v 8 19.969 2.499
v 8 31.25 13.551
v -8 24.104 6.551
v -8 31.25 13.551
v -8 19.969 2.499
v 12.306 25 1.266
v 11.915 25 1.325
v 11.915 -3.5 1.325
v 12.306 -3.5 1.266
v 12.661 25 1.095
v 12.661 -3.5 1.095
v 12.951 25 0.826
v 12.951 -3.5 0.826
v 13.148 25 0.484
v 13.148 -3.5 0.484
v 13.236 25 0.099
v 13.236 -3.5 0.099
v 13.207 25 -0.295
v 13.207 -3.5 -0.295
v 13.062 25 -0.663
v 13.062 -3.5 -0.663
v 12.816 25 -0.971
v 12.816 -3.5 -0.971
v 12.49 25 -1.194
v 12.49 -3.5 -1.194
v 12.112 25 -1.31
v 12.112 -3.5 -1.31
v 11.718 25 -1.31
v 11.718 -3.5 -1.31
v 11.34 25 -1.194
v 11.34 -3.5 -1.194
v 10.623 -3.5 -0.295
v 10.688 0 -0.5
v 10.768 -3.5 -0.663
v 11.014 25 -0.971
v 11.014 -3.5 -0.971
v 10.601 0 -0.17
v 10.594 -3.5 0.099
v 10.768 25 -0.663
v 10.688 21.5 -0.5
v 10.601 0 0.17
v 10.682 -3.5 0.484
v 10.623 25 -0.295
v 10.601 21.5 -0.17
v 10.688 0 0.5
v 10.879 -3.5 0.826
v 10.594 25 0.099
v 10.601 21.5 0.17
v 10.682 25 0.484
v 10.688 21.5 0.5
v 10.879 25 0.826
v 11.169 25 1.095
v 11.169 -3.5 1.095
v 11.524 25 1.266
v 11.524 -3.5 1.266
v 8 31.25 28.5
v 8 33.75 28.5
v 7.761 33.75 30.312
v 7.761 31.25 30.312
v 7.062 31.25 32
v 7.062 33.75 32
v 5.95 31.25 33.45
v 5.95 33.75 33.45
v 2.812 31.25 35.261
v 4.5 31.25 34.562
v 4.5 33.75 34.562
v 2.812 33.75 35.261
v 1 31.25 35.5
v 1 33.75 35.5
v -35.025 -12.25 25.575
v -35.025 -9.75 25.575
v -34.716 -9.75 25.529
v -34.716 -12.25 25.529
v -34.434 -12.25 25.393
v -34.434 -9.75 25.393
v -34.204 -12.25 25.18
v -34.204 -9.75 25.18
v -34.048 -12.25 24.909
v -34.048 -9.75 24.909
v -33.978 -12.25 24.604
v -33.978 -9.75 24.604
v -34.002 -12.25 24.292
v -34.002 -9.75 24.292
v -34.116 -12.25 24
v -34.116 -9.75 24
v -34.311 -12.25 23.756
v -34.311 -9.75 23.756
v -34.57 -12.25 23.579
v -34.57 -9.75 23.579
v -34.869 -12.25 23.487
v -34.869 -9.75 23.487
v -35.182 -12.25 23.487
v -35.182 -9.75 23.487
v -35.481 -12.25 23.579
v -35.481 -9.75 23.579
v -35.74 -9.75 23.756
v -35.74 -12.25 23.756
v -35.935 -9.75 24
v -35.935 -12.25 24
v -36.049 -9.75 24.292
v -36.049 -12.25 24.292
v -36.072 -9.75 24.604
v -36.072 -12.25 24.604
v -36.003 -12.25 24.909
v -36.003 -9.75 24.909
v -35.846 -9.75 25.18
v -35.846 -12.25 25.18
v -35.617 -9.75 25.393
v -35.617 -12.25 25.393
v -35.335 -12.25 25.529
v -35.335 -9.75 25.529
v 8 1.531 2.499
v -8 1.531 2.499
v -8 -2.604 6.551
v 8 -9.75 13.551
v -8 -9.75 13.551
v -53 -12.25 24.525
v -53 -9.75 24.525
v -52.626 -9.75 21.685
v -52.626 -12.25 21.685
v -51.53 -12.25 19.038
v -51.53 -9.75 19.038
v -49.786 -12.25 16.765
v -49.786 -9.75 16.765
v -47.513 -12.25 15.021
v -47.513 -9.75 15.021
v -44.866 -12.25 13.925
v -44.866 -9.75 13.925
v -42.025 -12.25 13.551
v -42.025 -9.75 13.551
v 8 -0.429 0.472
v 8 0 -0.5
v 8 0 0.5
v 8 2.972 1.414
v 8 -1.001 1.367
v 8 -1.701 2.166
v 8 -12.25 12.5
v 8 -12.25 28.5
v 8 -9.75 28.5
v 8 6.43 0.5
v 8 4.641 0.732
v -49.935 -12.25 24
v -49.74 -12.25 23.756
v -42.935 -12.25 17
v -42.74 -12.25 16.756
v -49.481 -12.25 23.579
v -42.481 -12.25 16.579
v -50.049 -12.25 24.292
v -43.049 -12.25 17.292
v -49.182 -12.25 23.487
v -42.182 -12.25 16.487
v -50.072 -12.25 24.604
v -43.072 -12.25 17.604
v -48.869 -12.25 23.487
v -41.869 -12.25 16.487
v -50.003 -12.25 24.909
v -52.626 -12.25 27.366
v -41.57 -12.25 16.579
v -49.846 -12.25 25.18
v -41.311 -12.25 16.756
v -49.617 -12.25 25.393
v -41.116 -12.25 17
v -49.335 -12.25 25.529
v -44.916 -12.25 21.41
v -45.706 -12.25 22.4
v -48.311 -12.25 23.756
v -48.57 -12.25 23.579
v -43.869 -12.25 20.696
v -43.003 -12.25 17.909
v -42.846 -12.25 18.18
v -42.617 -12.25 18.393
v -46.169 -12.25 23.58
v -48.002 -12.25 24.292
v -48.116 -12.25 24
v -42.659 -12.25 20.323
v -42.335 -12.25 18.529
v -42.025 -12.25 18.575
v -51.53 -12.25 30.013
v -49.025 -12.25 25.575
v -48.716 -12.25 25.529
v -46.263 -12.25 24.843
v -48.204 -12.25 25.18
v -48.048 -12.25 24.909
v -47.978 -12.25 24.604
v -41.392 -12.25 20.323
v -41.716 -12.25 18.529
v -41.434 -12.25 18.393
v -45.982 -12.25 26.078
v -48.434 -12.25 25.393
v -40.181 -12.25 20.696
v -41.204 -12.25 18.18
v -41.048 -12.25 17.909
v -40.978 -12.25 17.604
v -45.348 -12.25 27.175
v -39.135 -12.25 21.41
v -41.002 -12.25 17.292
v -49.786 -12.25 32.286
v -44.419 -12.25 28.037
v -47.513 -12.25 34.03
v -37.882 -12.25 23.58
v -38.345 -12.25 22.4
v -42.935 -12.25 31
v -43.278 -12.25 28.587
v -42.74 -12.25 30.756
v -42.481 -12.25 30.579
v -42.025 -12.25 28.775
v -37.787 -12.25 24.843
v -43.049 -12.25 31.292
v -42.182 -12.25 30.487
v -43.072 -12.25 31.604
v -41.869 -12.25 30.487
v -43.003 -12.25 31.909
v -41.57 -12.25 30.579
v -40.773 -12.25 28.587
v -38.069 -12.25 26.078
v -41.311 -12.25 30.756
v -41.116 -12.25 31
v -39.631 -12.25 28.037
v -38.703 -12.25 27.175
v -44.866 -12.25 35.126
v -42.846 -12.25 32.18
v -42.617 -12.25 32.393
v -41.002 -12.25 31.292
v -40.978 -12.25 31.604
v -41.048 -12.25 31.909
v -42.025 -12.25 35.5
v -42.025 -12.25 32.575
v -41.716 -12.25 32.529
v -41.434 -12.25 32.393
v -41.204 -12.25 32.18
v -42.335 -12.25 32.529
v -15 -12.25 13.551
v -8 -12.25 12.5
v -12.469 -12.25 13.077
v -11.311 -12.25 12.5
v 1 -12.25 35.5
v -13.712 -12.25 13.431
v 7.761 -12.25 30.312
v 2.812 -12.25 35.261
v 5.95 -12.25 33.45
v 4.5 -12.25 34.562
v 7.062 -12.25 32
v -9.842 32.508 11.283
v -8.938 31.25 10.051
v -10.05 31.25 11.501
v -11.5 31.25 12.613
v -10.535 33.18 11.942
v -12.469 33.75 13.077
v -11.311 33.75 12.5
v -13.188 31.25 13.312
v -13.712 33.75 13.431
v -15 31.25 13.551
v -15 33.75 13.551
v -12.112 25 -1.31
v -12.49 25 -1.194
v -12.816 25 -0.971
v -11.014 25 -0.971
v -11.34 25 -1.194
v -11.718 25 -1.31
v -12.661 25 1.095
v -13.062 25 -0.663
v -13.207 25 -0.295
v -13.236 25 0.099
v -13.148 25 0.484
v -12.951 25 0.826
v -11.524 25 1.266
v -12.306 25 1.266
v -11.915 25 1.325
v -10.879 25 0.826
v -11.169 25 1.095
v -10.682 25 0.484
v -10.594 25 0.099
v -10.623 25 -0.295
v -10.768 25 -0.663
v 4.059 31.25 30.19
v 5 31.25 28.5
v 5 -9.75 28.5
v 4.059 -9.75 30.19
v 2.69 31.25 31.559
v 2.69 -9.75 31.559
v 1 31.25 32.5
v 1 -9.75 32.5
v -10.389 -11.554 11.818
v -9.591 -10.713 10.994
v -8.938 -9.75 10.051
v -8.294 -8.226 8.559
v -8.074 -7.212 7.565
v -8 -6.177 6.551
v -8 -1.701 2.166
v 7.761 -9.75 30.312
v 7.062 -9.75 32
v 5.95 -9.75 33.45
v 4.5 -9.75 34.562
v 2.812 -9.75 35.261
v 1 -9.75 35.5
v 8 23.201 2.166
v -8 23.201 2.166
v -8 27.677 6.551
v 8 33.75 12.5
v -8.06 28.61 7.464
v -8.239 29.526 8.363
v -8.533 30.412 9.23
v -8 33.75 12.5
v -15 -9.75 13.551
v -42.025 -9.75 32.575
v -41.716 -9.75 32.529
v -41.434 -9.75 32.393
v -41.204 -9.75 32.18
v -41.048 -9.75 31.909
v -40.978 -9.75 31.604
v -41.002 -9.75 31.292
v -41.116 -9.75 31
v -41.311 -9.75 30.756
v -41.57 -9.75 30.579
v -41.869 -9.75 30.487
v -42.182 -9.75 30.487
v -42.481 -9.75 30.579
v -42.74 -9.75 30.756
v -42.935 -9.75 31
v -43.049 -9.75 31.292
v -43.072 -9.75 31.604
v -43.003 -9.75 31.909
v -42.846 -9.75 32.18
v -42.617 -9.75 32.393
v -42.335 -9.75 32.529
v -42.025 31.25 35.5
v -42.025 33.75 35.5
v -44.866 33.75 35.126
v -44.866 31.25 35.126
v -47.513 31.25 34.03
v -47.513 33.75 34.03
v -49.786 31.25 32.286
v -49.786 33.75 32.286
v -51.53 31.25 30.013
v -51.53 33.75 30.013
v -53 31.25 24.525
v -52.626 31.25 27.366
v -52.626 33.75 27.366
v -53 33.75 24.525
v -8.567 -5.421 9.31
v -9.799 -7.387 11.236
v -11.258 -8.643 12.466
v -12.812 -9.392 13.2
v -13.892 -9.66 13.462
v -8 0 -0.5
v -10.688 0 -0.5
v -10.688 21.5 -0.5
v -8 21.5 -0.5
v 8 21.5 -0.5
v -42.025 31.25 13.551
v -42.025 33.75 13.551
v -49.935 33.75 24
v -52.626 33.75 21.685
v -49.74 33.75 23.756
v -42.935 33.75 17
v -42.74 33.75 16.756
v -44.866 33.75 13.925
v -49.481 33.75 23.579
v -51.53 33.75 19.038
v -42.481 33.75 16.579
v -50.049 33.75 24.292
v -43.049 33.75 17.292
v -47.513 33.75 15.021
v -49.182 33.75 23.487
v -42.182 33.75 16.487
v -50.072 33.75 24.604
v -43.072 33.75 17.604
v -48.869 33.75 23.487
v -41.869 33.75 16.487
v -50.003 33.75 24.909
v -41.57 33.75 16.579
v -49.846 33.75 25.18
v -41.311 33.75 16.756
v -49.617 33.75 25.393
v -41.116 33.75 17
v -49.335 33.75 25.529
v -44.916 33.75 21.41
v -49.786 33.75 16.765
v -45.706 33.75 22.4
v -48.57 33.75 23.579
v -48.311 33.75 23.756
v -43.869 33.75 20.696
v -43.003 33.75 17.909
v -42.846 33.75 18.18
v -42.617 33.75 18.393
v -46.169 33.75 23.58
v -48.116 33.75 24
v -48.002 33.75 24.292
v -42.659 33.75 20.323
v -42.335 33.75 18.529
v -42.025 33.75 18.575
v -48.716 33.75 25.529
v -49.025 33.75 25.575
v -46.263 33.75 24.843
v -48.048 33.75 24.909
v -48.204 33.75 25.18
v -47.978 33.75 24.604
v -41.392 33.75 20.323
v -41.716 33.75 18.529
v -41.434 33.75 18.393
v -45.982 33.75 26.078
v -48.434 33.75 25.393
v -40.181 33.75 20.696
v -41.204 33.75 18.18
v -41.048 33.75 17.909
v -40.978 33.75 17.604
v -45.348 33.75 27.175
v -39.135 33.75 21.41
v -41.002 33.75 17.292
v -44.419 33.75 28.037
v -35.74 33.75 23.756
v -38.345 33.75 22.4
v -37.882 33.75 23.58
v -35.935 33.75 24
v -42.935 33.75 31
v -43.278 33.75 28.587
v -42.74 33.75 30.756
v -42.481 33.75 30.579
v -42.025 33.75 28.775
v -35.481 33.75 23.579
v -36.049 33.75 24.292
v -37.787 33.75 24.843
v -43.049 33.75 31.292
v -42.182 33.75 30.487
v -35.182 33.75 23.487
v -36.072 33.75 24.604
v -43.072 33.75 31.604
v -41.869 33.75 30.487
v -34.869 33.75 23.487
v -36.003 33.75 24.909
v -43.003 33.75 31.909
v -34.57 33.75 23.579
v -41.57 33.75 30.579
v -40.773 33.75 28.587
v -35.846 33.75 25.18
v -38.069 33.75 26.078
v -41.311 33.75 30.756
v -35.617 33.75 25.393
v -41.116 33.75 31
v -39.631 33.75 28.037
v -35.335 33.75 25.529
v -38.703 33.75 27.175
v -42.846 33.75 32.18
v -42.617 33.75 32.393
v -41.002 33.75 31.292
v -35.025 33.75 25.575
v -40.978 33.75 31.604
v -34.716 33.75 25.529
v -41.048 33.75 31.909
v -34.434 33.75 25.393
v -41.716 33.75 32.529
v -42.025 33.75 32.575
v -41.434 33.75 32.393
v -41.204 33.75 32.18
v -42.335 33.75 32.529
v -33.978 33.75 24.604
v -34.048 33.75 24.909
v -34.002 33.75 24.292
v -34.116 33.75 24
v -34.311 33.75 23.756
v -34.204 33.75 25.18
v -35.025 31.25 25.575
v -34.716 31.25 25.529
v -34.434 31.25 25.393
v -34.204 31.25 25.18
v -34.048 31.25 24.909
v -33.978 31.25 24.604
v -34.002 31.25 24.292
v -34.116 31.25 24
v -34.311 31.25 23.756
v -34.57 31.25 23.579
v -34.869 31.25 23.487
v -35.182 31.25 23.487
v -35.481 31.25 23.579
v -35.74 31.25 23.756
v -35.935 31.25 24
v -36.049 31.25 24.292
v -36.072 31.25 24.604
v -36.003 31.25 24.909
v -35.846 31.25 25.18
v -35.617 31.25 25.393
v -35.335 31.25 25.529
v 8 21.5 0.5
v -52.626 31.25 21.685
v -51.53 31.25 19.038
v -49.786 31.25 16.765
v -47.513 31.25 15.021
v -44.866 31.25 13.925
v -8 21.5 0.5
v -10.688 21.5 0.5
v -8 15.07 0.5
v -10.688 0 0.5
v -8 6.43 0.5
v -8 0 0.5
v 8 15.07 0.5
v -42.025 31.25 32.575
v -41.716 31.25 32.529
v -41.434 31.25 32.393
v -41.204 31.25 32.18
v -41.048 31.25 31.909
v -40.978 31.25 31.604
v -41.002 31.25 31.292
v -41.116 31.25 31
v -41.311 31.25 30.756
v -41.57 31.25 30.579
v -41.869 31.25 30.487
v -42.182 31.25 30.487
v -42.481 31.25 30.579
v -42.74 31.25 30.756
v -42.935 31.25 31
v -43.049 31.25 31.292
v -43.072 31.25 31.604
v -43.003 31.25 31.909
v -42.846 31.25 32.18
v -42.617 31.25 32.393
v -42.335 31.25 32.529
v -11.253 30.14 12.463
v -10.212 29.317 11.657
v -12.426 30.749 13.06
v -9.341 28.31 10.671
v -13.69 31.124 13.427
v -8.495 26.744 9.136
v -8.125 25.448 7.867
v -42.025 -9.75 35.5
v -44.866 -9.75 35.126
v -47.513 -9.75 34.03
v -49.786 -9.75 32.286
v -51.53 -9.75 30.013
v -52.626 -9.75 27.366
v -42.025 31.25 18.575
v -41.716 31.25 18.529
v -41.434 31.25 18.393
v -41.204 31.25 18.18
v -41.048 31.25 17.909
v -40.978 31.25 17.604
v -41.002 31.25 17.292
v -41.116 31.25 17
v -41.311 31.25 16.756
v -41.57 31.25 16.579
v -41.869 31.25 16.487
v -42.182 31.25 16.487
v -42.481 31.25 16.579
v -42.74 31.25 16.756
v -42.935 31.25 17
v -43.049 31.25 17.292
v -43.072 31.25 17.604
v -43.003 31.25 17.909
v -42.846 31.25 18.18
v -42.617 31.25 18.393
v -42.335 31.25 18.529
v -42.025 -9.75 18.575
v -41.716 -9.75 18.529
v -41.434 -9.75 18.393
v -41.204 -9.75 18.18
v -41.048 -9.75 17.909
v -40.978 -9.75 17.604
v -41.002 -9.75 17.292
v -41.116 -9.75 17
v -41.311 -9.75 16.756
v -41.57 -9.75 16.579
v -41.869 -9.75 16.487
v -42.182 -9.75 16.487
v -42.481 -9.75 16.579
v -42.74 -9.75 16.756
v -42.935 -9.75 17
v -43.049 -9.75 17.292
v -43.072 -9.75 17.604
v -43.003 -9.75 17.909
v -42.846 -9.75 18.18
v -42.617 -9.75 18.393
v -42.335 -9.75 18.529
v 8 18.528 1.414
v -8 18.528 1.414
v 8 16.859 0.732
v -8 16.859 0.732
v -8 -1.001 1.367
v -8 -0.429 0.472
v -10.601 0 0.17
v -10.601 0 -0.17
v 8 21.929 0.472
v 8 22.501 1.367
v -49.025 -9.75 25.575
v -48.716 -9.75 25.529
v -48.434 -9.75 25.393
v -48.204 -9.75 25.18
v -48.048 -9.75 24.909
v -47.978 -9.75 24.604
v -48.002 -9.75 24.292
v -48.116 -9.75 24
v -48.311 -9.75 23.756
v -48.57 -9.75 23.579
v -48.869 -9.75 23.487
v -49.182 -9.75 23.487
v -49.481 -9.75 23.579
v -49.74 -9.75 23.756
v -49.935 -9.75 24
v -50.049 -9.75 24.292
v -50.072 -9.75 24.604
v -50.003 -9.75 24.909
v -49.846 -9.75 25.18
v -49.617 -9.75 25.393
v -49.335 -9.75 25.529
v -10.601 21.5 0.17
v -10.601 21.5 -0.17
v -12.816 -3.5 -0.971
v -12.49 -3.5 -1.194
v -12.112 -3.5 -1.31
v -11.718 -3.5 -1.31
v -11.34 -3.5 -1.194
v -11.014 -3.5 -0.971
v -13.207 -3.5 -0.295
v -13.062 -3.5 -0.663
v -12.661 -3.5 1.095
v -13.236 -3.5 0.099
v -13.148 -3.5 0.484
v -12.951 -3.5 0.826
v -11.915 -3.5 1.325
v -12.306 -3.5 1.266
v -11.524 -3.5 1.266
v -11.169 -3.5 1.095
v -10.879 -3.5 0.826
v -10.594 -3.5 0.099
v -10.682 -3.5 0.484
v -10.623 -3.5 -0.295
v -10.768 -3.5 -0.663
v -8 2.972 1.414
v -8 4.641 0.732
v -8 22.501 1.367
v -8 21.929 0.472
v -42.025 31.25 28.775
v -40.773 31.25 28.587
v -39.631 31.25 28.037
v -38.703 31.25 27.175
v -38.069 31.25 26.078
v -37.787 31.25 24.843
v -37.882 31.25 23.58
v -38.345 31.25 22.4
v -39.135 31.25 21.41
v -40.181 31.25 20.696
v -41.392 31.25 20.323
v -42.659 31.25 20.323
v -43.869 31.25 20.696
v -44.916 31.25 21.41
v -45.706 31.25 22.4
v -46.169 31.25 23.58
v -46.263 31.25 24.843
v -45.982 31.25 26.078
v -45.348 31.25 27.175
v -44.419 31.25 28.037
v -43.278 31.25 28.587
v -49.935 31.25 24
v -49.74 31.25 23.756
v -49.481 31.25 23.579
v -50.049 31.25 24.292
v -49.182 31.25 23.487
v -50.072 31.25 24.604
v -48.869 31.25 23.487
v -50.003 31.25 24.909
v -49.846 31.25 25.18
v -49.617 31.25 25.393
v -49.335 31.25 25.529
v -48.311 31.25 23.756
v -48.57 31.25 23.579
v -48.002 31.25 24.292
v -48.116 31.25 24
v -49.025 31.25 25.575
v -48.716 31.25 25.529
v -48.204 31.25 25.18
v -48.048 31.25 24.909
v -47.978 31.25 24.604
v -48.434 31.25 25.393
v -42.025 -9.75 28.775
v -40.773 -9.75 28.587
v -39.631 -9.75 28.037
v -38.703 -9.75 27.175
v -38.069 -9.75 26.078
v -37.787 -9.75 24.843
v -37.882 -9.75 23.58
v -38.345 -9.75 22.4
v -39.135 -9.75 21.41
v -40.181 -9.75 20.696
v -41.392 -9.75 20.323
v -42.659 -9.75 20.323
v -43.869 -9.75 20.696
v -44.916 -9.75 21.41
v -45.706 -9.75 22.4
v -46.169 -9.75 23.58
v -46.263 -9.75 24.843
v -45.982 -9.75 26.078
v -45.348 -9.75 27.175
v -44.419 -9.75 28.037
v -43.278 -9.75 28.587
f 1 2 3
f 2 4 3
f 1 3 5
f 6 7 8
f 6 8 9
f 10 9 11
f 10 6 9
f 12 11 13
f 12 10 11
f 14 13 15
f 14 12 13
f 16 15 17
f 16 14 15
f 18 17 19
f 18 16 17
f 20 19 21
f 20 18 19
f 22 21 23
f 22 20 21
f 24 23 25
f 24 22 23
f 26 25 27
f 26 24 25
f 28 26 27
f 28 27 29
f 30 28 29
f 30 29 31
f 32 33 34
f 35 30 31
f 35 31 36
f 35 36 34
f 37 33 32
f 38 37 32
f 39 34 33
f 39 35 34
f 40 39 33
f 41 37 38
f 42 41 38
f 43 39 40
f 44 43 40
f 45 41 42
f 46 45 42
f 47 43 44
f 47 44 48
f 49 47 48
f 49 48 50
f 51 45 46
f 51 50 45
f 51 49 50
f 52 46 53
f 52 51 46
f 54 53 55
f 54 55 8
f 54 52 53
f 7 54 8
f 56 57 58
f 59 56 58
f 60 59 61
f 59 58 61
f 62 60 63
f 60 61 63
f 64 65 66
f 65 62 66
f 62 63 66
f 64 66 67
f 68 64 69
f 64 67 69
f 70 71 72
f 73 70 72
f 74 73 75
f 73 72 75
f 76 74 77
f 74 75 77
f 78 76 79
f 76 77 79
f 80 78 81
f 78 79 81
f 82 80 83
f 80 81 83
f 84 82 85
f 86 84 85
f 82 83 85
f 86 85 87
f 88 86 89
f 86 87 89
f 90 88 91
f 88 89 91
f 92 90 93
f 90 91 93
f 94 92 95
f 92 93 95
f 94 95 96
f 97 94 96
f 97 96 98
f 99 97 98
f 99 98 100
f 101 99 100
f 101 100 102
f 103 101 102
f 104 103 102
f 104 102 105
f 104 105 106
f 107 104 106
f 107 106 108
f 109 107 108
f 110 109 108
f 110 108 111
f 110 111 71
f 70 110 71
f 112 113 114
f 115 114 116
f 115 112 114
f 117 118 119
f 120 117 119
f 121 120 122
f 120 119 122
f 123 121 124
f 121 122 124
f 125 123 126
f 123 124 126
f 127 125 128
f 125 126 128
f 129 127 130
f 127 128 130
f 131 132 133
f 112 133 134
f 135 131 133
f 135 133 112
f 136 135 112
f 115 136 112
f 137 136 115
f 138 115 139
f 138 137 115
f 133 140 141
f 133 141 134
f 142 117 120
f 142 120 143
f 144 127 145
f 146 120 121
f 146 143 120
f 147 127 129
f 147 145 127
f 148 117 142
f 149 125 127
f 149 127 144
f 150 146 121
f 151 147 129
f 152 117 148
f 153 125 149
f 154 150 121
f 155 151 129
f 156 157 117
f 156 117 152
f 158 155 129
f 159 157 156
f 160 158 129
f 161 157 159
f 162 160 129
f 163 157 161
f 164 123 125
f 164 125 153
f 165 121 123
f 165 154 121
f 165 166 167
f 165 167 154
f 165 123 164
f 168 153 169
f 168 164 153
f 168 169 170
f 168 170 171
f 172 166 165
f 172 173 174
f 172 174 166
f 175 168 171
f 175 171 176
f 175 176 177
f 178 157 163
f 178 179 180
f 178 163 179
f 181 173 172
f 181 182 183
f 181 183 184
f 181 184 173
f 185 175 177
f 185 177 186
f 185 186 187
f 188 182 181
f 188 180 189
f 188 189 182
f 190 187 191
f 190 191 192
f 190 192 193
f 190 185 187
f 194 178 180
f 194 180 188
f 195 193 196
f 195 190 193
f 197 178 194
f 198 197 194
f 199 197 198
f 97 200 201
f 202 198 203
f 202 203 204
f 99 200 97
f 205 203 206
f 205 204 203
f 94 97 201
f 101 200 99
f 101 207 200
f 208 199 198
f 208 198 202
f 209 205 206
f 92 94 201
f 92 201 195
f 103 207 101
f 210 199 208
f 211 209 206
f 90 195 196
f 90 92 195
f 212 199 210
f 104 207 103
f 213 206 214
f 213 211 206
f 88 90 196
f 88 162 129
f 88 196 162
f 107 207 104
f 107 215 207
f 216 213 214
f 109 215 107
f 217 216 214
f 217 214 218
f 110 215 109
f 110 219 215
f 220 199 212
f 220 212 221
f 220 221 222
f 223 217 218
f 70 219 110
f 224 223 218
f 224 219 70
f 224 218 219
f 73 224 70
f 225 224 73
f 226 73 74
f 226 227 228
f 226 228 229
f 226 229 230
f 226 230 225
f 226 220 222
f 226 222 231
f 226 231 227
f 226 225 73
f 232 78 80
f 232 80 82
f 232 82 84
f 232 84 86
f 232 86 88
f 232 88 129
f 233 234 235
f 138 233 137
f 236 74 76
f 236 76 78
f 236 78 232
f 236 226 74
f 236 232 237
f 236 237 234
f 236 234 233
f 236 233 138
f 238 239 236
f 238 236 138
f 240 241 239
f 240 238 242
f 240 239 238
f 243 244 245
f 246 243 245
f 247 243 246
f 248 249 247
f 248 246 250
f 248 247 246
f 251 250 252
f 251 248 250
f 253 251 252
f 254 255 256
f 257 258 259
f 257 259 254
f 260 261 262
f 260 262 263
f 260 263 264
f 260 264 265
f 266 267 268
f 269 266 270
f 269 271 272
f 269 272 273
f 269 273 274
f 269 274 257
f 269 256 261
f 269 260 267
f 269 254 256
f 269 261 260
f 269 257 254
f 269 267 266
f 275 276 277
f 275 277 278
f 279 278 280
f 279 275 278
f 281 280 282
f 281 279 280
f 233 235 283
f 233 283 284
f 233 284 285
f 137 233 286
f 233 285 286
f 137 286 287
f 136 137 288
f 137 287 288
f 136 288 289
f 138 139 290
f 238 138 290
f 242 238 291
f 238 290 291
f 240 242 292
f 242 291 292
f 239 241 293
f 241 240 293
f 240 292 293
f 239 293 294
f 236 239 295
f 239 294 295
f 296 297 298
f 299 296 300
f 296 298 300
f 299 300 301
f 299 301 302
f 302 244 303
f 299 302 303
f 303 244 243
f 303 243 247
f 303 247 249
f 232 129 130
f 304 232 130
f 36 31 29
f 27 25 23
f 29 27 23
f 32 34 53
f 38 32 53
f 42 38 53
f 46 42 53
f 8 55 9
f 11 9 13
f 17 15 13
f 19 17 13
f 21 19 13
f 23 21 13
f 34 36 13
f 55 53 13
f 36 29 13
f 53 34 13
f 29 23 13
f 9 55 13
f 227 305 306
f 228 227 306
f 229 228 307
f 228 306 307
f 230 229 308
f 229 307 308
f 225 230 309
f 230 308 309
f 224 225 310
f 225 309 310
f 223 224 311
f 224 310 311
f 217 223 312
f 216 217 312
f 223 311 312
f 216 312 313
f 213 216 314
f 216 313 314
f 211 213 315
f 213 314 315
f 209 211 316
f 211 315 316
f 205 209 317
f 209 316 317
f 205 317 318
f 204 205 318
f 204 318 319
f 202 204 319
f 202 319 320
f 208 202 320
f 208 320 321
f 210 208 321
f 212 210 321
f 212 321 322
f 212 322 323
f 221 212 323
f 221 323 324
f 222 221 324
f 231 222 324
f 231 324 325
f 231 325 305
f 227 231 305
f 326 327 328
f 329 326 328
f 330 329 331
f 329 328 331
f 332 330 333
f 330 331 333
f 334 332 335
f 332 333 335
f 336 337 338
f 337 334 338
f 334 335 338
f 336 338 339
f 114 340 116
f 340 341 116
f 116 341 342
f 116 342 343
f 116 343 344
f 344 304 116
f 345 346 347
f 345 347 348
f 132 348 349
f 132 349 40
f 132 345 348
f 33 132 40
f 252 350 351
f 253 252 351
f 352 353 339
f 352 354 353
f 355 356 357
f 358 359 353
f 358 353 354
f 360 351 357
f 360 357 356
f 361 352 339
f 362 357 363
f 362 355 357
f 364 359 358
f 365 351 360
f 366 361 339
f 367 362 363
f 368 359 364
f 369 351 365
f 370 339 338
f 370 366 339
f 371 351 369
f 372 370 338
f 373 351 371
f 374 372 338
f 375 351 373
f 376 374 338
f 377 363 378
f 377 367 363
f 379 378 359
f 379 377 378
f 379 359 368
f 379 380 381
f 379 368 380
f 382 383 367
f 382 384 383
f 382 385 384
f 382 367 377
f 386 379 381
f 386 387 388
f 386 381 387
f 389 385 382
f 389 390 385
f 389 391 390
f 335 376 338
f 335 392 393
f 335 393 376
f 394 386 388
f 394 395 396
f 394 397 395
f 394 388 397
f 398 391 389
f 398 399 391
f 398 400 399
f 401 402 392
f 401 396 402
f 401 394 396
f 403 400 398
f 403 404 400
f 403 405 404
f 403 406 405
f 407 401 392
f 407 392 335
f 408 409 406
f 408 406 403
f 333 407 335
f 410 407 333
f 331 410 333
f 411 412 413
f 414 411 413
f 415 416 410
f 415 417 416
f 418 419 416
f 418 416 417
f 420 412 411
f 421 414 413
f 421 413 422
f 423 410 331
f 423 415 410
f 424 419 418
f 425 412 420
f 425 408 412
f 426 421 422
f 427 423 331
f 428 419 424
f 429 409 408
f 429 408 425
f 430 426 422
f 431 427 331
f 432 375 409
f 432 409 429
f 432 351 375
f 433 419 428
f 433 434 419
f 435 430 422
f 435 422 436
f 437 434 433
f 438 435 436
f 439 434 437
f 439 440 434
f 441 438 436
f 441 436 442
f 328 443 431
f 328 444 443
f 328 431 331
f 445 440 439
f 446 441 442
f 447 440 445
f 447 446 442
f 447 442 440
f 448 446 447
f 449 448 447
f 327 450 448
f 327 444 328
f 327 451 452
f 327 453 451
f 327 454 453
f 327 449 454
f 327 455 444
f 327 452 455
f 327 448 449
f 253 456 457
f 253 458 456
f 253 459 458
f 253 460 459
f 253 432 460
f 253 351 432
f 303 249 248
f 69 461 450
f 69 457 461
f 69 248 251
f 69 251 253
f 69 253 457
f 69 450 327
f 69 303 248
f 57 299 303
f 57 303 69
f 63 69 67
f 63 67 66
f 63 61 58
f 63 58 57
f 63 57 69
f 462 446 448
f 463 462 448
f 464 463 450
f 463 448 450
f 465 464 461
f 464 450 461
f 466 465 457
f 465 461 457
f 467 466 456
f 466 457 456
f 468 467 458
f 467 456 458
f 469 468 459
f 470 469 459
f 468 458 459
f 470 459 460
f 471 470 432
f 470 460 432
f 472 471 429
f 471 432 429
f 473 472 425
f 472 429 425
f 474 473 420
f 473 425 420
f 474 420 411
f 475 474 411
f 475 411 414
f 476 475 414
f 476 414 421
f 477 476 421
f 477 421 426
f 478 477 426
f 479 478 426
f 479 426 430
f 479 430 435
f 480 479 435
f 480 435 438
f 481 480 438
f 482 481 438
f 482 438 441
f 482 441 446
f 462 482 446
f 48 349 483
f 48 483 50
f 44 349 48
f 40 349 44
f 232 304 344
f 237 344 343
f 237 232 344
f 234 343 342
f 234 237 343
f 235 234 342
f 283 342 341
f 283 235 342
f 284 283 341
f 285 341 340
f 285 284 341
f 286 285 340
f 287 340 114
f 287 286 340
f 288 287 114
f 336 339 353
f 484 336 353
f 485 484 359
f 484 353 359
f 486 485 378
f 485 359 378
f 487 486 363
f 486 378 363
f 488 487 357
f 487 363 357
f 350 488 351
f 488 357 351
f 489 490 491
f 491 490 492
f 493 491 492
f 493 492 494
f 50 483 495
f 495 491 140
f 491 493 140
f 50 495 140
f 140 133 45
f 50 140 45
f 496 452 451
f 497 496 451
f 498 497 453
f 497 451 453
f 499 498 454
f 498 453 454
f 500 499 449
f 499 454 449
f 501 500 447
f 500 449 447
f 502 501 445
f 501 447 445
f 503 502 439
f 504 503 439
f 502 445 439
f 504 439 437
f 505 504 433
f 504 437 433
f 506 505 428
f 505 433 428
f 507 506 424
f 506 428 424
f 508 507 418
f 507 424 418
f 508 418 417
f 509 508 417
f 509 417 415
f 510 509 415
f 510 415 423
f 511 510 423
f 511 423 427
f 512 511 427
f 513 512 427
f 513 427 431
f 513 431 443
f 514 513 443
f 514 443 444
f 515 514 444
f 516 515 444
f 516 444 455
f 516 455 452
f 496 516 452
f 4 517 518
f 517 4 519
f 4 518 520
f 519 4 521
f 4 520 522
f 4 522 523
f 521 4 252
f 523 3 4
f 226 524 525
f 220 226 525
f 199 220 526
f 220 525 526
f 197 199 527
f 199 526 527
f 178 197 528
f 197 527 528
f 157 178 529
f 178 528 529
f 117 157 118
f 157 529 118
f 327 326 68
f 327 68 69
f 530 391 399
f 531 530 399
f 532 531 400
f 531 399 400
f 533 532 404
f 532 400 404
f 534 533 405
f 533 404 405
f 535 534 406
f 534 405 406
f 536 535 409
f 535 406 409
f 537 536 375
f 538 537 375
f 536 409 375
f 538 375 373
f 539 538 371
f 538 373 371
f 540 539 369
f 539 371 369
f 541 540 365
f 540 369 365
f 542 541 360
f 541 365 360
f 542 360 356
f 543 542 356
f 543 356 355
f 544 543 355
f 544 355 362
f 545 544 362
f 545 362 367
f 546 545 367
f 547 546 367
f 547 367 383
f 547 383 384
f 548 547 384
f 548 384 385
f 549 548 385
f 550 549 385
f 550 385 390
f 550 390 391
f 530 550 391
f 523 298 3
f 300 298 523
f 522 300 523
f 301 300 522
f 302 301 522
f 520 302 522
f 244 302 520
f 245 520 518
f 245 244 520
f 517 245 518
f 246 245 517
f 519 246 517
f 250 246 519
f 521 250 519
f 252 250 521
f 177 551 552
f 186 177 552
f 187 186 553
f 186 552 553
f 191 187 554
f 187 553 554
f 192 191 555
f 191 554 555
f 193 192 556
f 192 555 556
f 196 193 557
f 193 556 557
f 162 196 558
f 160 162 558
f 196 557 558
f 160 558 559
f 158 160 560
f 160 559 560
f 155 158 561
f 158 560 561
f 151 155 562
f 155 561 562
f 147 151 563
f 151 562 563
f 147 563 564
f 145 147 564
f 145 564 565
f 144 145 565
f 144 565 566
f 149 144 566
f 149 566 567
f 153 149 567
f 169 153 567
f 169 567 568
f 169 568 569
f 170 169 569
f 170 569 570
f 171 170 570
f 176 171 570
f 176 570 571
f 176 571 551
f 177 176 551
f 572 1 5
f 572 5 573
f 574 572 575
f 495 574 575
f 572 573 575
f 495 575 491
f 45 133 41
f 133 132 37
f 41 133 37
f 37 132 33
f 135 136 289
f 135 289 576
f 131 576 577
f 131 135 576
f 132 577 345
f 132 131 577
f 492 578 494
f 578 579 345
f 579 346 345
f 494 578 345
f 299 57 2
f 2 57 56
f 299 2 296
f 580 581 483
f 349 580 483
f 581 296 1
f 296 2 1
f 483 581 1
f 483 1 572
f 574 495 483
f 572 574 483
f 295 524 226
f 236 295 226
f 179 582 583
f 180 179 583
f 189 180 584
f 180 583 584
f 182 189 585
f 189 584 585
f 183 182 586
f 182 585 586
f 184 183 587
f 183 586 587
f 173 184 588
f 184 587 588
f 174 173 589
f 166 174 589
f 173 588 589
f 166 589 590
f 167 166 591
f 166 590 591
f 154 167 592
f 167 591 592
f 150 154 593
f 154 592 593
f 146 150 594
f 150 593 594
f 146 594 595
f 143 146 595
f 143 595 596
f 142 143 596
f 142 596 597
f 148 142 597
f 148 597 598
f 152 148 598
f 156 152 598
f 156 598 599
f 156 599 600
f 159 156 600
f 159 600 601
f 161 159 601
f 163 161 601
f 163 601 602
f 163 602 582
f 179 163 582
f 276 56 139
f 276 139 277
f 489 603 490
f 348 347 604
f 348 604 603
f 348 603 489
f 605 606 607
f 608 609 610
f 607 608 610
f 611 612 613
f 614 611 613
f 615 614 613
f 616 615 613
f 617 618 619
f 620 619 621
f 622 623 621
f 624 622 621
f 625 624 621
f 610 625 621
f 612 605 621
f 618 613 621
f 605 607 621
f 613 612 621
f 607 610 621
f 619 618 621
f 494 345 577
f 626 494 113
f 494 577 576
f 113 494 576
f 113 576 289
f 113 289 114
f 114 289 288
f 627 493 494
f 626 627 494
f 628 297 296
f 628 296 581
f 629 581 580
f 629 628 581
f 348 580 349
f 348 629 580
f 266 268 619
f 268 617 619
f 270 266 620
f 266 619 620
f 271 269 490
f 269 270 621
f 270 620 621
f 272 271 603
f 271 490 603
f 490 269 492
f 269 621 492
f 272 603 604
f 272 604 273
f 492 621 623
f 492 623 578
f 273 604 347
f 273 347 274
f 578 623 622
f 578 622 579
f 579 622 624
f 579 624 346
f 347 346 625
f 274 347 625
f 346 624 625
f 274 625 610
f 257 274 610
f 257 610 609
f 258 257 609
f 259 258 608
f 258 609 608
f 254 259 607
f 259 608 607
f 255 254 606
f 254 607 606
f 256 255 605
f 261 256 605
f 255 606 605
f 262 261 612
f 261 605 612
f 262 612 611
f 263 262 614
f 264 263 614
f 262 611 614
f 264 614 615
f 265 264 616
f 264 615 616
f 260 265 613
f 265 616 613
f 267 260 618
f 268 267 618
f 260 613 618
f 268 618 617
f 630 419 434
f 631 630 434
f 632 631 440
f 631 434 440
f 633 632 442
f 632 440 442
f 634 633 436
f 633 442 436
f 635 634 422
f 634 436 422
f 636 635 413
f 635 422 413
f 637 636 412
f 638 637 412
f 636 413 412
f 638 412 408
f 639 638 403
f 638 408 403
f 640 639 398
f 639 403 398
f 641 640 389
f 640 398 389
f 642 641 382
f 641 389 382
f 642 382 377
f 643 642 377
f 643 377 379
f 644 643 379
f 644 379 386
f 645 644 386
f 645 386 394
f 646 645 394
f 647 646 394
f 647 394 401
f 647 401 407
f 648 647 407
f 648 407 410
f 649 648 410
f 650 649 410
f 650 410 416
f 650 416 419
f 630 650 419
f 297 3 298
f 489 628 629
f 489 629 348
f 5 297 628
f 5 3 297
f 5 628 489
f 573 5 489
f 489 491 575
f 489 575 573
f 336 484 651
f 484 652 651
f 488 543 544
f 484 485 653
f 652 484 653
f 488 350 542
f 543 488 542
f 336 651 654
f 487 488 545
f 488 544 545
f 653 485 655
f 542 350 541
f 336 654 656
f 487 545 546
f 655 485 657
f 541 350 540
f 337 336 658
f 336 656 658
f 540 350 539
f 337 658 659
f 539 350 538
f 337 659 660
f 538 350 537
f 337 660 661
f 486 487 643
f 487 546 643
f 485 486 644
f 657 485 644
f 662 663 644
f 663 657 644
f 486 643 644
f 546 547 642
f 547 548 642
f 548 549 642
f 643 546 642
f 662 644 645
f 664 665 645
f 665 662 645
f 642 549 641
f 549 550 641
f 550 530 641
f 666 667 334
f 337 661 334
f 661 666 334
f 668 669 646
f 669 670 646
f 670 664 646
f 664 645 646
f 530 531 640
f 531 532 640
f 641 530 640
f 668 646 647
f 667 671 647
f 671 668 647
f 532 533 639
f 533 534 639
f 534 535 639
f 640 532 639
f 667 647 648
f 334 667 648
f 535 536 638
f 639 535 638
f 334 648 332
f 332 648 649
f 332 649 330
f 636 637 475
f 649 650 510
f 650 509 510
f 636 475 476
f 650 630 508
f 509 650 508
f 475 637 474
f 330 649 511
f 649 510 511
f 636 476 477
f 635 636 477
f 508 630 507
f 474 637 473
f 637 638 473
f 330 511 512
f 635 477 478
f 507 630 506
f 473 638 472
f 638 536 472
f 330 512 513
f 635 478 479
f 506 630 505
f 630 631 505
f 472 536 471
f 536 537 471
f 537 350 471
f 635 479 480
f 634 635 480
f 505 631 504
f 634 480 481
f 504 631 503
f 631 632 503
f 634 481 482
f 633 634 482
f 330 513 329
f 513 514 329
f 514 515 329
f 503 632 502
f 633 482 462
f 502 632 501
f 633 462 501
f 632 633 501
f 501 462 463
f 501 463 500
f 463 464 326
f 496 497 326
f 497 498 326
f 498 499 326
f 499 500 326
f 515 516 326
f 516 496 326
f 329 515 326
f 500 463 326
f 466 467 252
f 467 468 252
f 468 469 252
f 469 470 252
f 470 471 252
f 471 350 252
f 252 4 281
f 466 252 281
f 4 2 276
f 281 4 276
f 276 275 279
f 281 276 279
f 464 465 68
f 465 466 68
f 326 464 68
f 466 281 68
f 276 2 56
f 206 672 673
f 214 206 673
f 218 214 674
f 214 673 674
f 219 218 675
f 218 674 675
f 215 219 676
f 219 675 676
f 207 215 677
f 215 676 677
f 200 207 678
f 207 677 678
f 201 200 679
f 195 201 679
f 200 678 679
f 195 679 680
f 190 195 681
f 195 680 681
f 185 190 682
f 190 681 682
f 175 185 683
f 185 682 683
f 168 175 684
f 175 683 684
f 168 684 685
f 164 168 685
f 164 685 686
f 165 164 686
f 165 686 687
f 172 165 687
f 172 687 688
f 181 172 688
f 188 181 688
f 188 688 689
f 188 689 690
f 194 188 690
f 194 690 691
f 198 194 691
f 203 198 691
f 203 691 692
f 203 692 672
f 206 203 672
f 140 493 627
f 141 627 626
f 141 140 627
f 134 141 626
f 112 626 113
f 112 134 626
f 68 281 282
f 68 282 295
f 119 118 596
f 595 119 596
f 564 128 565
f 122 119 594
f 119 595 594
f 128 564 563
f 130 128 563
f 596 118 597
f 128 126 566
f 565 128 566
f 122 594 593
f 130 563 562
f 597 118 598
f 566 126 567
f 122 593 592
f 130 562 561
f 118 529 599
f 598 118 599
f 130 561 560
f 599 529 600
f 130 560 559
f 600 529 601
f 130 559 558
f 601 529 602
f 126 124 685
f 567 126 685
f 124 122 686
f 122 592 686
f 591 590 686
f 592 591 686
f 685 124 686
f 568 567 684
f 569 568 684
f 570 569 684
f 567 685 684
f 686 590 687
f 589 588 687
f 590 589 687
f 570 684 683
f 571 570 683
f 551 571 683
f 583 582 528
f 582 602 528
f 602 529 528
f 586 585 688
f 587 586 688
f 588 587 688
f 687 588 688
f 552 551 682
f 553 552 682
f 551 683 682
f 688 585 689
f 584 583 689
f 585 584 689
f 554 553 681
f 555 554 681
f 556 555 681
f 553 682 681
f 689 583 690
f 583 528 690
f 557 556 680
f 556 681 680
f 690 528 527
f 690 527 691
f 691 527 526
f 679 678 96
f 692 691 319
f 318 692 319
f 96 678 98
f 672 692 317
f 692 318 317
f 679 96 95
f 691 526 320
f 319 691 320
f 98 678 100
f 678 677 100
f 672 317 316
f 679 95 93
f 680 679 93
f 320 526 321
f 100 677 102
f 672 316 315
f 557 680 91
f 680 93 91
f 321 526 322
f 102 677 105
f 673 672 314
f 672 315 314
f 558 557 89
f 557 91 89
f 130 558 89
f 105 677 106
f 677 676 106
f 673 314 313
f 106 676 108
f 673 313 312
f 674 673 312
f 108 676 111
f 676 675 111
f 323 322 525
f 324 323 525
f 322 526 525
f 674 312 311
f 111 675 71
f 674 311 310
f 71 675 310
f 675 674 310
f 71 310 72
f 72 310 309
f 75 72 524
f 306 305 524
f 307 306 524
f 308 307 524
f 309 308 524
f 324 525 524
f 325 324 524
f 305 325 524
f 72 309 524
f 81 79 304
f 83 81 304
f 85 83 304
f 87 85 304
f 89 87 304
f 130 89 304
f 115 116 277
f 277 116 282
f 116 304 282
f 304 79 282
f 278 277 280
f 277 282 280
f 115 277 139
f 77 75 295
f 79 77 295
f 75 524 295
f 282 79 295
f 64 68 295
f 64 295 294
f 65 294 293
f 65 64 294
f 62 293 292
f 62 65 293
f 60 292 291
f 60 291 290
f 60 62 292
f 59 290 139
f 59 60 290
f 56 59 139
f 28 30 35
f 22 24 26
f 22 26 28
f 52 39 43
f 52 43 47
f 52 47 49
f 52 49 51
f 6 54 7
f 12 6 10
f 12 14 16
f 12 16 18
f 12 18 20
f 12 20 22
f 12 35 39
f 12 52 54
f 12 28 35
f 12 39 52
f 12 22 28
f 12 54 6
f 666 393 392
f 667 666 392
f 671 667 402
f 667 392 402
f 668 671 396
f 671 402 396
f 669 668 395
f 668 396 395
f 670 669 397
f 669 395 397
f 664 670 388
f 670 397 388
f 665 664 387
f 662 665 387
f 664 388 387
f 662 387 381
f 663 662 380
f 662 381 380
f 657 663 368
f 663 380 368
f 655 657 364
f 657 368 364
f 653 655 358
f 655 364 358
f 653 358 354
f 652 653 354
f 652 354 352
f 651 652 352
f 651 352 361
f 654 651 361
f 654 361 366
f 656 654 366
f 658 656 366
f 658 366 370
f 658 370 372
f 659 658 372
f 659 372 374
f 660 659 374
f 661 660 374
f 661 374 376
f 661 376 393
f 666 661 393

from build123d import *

# Parameters (mm, degrees)
SKETCH1_W           = 23.83
SKETCH1_H           = 1
BOSS_EXTRUDE1_DEPTH = 21.5
SKETCH2_R           = 1.325
BOSS_EXTRUDE2_DEPTH = 14.25
BOSS_EXTRUDE4_DEPTH = 8
SKETCH5_W           = 21.949336604
SKETCH5_H           = 2.5
BOSS_EXTRUDE5_DEPTH = 45
SKETCH6_R           = 4.25
SKETCH6_R_2         = 1.05
CUT_EXTRUDE1_DEPTH  = 79.646360374
FILLET1_R           = 7
FILLET2_R           = 7
FILLET3_R           = 7
BOSS_EXTRUDE6_START = 41
BOSS_EXTRUDE6_DEPTH = 41


with BuildPart() as part:
    # Sketch1 → Boss-Extrude1 (new body)
    with BuildSketch(Plane(origin=(0, 0, 0), x_dir=(1, 0, 0), z_dir=(0, 1, 0))):
        Rectangle(SKETCH1_W, SKETCH1_H)
    extrude(amount=BOSS_EXTRUDE1_DEPTH)

    # Sketch2 → Boss-Extrude2 (add, symmetric)
    with BuildSketch(Plane(origin=(0, 10.75, 0), x_dir=(1, 0, 0), z_dir=(0, 1, 0))):
        with Locations(Location((-11.915, 0, 0), (0, 0, 270))):
            Circle(SKETCH2_R)
        with Locations(Location((11.915, 0, 0), (0, 0, 270))):
            Circle(SKETCH2_R)
    extrude(amount=BOSS_EXTRUDE2_DEPTH, both=True)

    # Sketch4 → Boss-Extrude4 (add, symmetric)
    with BuildSketch(Plane(origin=(0, 0, 0), x_dir=(0, 0, -1), z_dir=(1, 0, 0))):
        Polygon((-0.5, 17.927447783), (-0.5, 21.5), (-12.5, 33.75), (-35.5, 33.75), (-35.5, 31.25), (-13.550663396, 31.25), align=None)
        Polygon((-0.5, 0), (-0.5, 3.572552217), (-13.550663396, -9.75), (-35.5, -9.75), (-35.5, -12.25), (-12.5, -12.25), align=None)
    extrude(amount=BOSS_EXTRUDE4_DEPTH, both=True)

    # Sketch5 → Boss-Extrude5 (add)
    with BuildSketch(Plane.ZY.offset(8)):
        with Locations((24.525331698, 32.5)):
            Rectangle(SKETCH5_W, SKETCH5_H)
        with Locations((24.525331698, -11)):
            Rectangle(SKETCH5_W, SKETCH5_H)
    extrude(amount=BOSS_EXTRUDE5_DEPTH)

    # Sketch6 → Cut-Extrude1 (cut, through all)
    with BuildSketch(Plane(origin=(0, 33.75, 0), x_dir=(1, 0, 0), z_dir=(0, 1, 0))):
        with Locations(Location((-42.025331698, -24.525331698, 0), (0, 0, 270))):
            Circle(SKETCH6_R)
        with Locations(Location((-49.025331698, -24.525331698, 0), (0, 0, 270))):
            Circle(SKETCH6_R_2)
        with Locations(Location((-42.025331698, -17.525331698, 0), (0, 0, 270))):
            Circle(SKETCH6_R_2)
        with Locations(Location((-35.025331698, -24.525331698, 0), (0, 0, 270))):
            Circle(SKETCH6_R_2)
        with Locations(Location((-42.025331698, -31.525331698, 0), (0, 0, 270))):
            Circle(SKETCH6_R_2)
        with BuildLine():
            ThreePointArc((-53, -24.525331698), (-49.785594076, -16.76506932), (-42.025331698, -13.550663396))
            Line((-42.025331698, -13.550663396), (-53, -13.550663396))
            Line((-53, -13.550663396), (-53, -24.525331698))
        make_face()
        with BuildLine():
            ThreePointArc((-42.025331698, -35.5), (-49.785594076, -32.285594076), (-53, -24.525331698))
            Line((-53, -24.525331698), (-53, -35.5))
            Line((-53, -35.5), (-42.025331698, -35.5))
        make_face()
    extrude(amount=-CUT_EXTRUDE1_DEPTH, mode=Mode.SUBTRACT)

    # Fillet1
    # the kernel refuses this fillet: 7 mm, written as the material it adds along each edge
    with BuildSketch(Plane(origin=(-8, -12.25, 13.550663396), x_dir=(-1, 0, 0), z_dir=(0, 1, 0))) as fillet1_piece_1_section:
        with BuildLine():
            CenterArc((FILLET1_R, -FILLET1_R), FILLET1_R, 90, 90)
            Line((0, -FILLET1_R), (0, 0))
            Line((0, 0), (FILLET1_R, 0))
        make_face()
    fillet1_piece_1 = extrude(amount=2.5, mode=Mode.PRIVATE)
    fillet1_piece_1 = split(fillet1_piece_1, bisect_by=Plane(origin=(-10.015975833, -11.661011889, 11.923032054), z_dir=(0, 0.699779834816443, 0.7143585813751185)), keep=Keep.TOP, mode=Mode.PRIVATE)
    fillet1_piece_1 = split(fillet1_piece_1, bisect_by=Plane(origin=(-10.015975833, -9.911562302, 13.708928508), z_dir=(0, -0.6997798348164429, -0.7143585813751187)), keep=Keep.TOP, mode=Mode.PRIVATE)
    add(fillet1_piece_1)
    with BuildSketch(Plane(origin=(-8, -12.25, 13.550663396), x_dir=(-1, 0, 0), z_dir=(0, 1, 0))) as fillet1_piece_2_section:
        with BuildLine():
            CenterArc((FILLET1_R, -FILLET1_R), FILLET1_R, 90, 90)
            Line((0, -FILLET1_R), (0, 0))
            Line((0, 0), (FILLET1_R, 0))
        make_face()
    fillet1_piece_2 = extrude(amount=20, mode=Mode.PRIVATE)
    fillet1_piece_2 = split(fillet1_piece_2, bisect_by=Plane(origin=(-8.812454151, -9.294822672, 9.605132414), z_dir=(0, 0.699779834816443, 0.7143585813751185)), keep=Keep.TOP, mode=Mode.PRIVATE)
    fillet1_piece_2 = split(fillet1_piece_2, bisect_by=Plane(origin=(-8.812454151, -9.75, 10.768831879), z_dir=(0, 1, 0)), keep=Keep.TOP, mode=Mode.PRIVATE)
    fillet1_piece_2 = split(fillet1_piece_2, bisect_by=Plane(origin=(-8.812454151, -7.545373085, 11.391028867), z_dir=(0, -0.6997798348164429, -0.7143585813751187)), keep=Keep.TOP, mode=Mode.PRIVATE)
    add(fillet1_piece_2)
    with BuildSketch(Plane(origin=(-8, 33.75, 13.550663396), x_dir=(0, 0, -1), z_dir=(0, -1, 0))) as fillet1_piece_3_section:
        with BuildLine():
            CenterArc((FILLET1_R, -FILLET1_R), FILLET1_R, 90, 90)
            Line((0, -FILLET1_R), (0, 0))
            Line((0, 0), (FILLET1_R, 0))
        make_face()
    fillet1_piece_3 = extrude(amount=2.5, mode=Mode.PRIVATE)
    fillet1_piece_3 = split(fillet1_piece_3, bisect_by=Plane(origin=(-10.015975833, 31.411562301, 13.708928507), z_dir=(0, 0.6997798348164431, -0.7143585813751184)), keep=Keep.TOP, mode=Mode.PRIVATE)
    fillet1_piece_3 = split(fillet1_piece_3, bisect_by=Plane(origin=(-10.015975833, 33.161011889, 11.923032054), z_dir=(0, -0.699779834816443, 0.7143585813751185)), keep=Keep.TOP, mode=Mode.PRIVATE)
    add(fillet1_piece_3)
    with BuildSketch(Plane(origin=(-8, 33.75, 13.550663396), x_dir=(0, 0, -1), z_dir=(0, -1, 0))) as fillet1_piece_4_section:
        with BuildLine():
            CenterArc((FILLET1_R, -FILLET1_R), FILLET1_R, 90, 90)
            Line((0, -FILLET1_R), (0, 0))
            Line((0, 0), (FILLET1_R, 0))
        make_face()
    fillet1_piece_4 = extrude(amount=20, mode=Mode.PRIVATE)
    fillet1_piece_4 = split(fillet1_piece_4, bisect_by=Plane(origin=(-8.812454159, 29.045373088, 11.39102887), z_dir=(0, 0.6997798348164431, -0.7143585813751184)), keep=Keep.TOP, mode=Mode.PRIVATE)
    fillet1_piece_4 = split(fillet1_piece_4, bisect_by=Plane(origin=(-8.812454159, 30.794822675, 9.605132416), z_dir=(0, -0.699779834816443, 0.7143585813751185)), keep=Keep.TOP, mode=Mode.PRIVATE)
    fillet1_piece_4 = split(fillet1_piece_4, bisect_by=Plane(origin=(-8.812454159, 31.25, 10.768831882), z_dir=(0, -1, 0)), keep=Keep.TOP, mode=Mode.PRIVATE)
    add(fillet1_piece_4)
    # the kernel refuses this fillet: 7 mm, written as the material it takes off along each edge
    with BuildSketch(Plane(origin=(8, 7.75, 35.5), x_dir=(0, 0, -1), z_dir=(0, -1, 0))) as fillet1_2_piece_1:
        with BuildLine():
            CenterArc((FILLET1_R, -FILLET1_R), FILLET1_R, 90, 90)
            Line((0, -FILLET1_R), (0, 0))
            Line((0, 0), (FILLET1_R, 0))
        make_face()
    extrude(amount=37.5, mode=Mode.SUBTRACT)
    with BuildSketch(Plane(origin=(8, 51.25, 35.5), x_dir=(-1, 0, 0), z_dir=(0, -1, 0))) as fillet1_2_piece_2:
        with BuildLine():
            CenterArc((FILLET1_R, FILLET1_R), FILLET1_R, 180, 90)
            Line((0, FILLET1_R), (0, 0))
            Line((0, 0), (FILLET1_R, 0))
        make_face()
    extrude(amount=37.5, mode=Mode.SUBTRACT)

    # Fillet2
    fillet2_edges = [part.edges().sort_by_distance(p)[0] for p in [
        (0, 17.927447783, 0.5),
        (0, 3.572552217, 0.5),
    ]]
    fillet(fillet2_edges, radius=FILLET2_R)

    # Fillet3
    # the kernel refuses this fillet: 7 mm, written as the material it adds along each edge
    with BuildSketch(Plane(origin=(-8, 21.5, 0.5), x_dir=(0, 0.7143585813744706, 0.6997798348171044), z_dir=(1, 0, 0))) as fillet3_piece_1:
        with BuildLine():
            CenterArc((2.380920079, -7), FILLET3_R, 90, 26.110260914)
            Line((-0.699779835, -0.714358581), (0, 0))
            Line((0, 0), (2.380920079, 0))
        make_face()
    extrude(amount=16)
    with BuildSketch(Plane(origin=(8, 0, 0.5), x_dir=(0, 0, -1), z_dir=(-1, 0, 0))) as fillet3_piece_2:
        with BuildLine():
            CenterArc((3.33439021, 6.599289533), FILLET3_R, 224.409342785, 26.110260914)
            Line((-1.666119859, 1.70083069), (0, 0))
            Line((0, 0), (1, 0))
        make_face()
    extrude(amount=16)

    # Sketch8 → Boss-Extrude6 (add)
    with BuildSketch(Plane(origin=(0, -9.75, 0), x_dir=(1, 0, 0), z_dir=(0, 1, 0)).offset(BOSS_EXTRUDE6_START)):
        with BuildLine():
            ThreePointArc((1, -35.5), (5.949747468, -33.449747468), (8, -28.5))
            Line((8, -28.5), (5, -28.5))
            ThreePointArc((5, -28.5), (3.422054899, -30.922054899), (1, -32.5))
            Line((1, -32.5), (1, -35.5))
        make_face()
    extrude(amount=-BOSS_EXTRUDE6_DEPTH)


solid = part.part
